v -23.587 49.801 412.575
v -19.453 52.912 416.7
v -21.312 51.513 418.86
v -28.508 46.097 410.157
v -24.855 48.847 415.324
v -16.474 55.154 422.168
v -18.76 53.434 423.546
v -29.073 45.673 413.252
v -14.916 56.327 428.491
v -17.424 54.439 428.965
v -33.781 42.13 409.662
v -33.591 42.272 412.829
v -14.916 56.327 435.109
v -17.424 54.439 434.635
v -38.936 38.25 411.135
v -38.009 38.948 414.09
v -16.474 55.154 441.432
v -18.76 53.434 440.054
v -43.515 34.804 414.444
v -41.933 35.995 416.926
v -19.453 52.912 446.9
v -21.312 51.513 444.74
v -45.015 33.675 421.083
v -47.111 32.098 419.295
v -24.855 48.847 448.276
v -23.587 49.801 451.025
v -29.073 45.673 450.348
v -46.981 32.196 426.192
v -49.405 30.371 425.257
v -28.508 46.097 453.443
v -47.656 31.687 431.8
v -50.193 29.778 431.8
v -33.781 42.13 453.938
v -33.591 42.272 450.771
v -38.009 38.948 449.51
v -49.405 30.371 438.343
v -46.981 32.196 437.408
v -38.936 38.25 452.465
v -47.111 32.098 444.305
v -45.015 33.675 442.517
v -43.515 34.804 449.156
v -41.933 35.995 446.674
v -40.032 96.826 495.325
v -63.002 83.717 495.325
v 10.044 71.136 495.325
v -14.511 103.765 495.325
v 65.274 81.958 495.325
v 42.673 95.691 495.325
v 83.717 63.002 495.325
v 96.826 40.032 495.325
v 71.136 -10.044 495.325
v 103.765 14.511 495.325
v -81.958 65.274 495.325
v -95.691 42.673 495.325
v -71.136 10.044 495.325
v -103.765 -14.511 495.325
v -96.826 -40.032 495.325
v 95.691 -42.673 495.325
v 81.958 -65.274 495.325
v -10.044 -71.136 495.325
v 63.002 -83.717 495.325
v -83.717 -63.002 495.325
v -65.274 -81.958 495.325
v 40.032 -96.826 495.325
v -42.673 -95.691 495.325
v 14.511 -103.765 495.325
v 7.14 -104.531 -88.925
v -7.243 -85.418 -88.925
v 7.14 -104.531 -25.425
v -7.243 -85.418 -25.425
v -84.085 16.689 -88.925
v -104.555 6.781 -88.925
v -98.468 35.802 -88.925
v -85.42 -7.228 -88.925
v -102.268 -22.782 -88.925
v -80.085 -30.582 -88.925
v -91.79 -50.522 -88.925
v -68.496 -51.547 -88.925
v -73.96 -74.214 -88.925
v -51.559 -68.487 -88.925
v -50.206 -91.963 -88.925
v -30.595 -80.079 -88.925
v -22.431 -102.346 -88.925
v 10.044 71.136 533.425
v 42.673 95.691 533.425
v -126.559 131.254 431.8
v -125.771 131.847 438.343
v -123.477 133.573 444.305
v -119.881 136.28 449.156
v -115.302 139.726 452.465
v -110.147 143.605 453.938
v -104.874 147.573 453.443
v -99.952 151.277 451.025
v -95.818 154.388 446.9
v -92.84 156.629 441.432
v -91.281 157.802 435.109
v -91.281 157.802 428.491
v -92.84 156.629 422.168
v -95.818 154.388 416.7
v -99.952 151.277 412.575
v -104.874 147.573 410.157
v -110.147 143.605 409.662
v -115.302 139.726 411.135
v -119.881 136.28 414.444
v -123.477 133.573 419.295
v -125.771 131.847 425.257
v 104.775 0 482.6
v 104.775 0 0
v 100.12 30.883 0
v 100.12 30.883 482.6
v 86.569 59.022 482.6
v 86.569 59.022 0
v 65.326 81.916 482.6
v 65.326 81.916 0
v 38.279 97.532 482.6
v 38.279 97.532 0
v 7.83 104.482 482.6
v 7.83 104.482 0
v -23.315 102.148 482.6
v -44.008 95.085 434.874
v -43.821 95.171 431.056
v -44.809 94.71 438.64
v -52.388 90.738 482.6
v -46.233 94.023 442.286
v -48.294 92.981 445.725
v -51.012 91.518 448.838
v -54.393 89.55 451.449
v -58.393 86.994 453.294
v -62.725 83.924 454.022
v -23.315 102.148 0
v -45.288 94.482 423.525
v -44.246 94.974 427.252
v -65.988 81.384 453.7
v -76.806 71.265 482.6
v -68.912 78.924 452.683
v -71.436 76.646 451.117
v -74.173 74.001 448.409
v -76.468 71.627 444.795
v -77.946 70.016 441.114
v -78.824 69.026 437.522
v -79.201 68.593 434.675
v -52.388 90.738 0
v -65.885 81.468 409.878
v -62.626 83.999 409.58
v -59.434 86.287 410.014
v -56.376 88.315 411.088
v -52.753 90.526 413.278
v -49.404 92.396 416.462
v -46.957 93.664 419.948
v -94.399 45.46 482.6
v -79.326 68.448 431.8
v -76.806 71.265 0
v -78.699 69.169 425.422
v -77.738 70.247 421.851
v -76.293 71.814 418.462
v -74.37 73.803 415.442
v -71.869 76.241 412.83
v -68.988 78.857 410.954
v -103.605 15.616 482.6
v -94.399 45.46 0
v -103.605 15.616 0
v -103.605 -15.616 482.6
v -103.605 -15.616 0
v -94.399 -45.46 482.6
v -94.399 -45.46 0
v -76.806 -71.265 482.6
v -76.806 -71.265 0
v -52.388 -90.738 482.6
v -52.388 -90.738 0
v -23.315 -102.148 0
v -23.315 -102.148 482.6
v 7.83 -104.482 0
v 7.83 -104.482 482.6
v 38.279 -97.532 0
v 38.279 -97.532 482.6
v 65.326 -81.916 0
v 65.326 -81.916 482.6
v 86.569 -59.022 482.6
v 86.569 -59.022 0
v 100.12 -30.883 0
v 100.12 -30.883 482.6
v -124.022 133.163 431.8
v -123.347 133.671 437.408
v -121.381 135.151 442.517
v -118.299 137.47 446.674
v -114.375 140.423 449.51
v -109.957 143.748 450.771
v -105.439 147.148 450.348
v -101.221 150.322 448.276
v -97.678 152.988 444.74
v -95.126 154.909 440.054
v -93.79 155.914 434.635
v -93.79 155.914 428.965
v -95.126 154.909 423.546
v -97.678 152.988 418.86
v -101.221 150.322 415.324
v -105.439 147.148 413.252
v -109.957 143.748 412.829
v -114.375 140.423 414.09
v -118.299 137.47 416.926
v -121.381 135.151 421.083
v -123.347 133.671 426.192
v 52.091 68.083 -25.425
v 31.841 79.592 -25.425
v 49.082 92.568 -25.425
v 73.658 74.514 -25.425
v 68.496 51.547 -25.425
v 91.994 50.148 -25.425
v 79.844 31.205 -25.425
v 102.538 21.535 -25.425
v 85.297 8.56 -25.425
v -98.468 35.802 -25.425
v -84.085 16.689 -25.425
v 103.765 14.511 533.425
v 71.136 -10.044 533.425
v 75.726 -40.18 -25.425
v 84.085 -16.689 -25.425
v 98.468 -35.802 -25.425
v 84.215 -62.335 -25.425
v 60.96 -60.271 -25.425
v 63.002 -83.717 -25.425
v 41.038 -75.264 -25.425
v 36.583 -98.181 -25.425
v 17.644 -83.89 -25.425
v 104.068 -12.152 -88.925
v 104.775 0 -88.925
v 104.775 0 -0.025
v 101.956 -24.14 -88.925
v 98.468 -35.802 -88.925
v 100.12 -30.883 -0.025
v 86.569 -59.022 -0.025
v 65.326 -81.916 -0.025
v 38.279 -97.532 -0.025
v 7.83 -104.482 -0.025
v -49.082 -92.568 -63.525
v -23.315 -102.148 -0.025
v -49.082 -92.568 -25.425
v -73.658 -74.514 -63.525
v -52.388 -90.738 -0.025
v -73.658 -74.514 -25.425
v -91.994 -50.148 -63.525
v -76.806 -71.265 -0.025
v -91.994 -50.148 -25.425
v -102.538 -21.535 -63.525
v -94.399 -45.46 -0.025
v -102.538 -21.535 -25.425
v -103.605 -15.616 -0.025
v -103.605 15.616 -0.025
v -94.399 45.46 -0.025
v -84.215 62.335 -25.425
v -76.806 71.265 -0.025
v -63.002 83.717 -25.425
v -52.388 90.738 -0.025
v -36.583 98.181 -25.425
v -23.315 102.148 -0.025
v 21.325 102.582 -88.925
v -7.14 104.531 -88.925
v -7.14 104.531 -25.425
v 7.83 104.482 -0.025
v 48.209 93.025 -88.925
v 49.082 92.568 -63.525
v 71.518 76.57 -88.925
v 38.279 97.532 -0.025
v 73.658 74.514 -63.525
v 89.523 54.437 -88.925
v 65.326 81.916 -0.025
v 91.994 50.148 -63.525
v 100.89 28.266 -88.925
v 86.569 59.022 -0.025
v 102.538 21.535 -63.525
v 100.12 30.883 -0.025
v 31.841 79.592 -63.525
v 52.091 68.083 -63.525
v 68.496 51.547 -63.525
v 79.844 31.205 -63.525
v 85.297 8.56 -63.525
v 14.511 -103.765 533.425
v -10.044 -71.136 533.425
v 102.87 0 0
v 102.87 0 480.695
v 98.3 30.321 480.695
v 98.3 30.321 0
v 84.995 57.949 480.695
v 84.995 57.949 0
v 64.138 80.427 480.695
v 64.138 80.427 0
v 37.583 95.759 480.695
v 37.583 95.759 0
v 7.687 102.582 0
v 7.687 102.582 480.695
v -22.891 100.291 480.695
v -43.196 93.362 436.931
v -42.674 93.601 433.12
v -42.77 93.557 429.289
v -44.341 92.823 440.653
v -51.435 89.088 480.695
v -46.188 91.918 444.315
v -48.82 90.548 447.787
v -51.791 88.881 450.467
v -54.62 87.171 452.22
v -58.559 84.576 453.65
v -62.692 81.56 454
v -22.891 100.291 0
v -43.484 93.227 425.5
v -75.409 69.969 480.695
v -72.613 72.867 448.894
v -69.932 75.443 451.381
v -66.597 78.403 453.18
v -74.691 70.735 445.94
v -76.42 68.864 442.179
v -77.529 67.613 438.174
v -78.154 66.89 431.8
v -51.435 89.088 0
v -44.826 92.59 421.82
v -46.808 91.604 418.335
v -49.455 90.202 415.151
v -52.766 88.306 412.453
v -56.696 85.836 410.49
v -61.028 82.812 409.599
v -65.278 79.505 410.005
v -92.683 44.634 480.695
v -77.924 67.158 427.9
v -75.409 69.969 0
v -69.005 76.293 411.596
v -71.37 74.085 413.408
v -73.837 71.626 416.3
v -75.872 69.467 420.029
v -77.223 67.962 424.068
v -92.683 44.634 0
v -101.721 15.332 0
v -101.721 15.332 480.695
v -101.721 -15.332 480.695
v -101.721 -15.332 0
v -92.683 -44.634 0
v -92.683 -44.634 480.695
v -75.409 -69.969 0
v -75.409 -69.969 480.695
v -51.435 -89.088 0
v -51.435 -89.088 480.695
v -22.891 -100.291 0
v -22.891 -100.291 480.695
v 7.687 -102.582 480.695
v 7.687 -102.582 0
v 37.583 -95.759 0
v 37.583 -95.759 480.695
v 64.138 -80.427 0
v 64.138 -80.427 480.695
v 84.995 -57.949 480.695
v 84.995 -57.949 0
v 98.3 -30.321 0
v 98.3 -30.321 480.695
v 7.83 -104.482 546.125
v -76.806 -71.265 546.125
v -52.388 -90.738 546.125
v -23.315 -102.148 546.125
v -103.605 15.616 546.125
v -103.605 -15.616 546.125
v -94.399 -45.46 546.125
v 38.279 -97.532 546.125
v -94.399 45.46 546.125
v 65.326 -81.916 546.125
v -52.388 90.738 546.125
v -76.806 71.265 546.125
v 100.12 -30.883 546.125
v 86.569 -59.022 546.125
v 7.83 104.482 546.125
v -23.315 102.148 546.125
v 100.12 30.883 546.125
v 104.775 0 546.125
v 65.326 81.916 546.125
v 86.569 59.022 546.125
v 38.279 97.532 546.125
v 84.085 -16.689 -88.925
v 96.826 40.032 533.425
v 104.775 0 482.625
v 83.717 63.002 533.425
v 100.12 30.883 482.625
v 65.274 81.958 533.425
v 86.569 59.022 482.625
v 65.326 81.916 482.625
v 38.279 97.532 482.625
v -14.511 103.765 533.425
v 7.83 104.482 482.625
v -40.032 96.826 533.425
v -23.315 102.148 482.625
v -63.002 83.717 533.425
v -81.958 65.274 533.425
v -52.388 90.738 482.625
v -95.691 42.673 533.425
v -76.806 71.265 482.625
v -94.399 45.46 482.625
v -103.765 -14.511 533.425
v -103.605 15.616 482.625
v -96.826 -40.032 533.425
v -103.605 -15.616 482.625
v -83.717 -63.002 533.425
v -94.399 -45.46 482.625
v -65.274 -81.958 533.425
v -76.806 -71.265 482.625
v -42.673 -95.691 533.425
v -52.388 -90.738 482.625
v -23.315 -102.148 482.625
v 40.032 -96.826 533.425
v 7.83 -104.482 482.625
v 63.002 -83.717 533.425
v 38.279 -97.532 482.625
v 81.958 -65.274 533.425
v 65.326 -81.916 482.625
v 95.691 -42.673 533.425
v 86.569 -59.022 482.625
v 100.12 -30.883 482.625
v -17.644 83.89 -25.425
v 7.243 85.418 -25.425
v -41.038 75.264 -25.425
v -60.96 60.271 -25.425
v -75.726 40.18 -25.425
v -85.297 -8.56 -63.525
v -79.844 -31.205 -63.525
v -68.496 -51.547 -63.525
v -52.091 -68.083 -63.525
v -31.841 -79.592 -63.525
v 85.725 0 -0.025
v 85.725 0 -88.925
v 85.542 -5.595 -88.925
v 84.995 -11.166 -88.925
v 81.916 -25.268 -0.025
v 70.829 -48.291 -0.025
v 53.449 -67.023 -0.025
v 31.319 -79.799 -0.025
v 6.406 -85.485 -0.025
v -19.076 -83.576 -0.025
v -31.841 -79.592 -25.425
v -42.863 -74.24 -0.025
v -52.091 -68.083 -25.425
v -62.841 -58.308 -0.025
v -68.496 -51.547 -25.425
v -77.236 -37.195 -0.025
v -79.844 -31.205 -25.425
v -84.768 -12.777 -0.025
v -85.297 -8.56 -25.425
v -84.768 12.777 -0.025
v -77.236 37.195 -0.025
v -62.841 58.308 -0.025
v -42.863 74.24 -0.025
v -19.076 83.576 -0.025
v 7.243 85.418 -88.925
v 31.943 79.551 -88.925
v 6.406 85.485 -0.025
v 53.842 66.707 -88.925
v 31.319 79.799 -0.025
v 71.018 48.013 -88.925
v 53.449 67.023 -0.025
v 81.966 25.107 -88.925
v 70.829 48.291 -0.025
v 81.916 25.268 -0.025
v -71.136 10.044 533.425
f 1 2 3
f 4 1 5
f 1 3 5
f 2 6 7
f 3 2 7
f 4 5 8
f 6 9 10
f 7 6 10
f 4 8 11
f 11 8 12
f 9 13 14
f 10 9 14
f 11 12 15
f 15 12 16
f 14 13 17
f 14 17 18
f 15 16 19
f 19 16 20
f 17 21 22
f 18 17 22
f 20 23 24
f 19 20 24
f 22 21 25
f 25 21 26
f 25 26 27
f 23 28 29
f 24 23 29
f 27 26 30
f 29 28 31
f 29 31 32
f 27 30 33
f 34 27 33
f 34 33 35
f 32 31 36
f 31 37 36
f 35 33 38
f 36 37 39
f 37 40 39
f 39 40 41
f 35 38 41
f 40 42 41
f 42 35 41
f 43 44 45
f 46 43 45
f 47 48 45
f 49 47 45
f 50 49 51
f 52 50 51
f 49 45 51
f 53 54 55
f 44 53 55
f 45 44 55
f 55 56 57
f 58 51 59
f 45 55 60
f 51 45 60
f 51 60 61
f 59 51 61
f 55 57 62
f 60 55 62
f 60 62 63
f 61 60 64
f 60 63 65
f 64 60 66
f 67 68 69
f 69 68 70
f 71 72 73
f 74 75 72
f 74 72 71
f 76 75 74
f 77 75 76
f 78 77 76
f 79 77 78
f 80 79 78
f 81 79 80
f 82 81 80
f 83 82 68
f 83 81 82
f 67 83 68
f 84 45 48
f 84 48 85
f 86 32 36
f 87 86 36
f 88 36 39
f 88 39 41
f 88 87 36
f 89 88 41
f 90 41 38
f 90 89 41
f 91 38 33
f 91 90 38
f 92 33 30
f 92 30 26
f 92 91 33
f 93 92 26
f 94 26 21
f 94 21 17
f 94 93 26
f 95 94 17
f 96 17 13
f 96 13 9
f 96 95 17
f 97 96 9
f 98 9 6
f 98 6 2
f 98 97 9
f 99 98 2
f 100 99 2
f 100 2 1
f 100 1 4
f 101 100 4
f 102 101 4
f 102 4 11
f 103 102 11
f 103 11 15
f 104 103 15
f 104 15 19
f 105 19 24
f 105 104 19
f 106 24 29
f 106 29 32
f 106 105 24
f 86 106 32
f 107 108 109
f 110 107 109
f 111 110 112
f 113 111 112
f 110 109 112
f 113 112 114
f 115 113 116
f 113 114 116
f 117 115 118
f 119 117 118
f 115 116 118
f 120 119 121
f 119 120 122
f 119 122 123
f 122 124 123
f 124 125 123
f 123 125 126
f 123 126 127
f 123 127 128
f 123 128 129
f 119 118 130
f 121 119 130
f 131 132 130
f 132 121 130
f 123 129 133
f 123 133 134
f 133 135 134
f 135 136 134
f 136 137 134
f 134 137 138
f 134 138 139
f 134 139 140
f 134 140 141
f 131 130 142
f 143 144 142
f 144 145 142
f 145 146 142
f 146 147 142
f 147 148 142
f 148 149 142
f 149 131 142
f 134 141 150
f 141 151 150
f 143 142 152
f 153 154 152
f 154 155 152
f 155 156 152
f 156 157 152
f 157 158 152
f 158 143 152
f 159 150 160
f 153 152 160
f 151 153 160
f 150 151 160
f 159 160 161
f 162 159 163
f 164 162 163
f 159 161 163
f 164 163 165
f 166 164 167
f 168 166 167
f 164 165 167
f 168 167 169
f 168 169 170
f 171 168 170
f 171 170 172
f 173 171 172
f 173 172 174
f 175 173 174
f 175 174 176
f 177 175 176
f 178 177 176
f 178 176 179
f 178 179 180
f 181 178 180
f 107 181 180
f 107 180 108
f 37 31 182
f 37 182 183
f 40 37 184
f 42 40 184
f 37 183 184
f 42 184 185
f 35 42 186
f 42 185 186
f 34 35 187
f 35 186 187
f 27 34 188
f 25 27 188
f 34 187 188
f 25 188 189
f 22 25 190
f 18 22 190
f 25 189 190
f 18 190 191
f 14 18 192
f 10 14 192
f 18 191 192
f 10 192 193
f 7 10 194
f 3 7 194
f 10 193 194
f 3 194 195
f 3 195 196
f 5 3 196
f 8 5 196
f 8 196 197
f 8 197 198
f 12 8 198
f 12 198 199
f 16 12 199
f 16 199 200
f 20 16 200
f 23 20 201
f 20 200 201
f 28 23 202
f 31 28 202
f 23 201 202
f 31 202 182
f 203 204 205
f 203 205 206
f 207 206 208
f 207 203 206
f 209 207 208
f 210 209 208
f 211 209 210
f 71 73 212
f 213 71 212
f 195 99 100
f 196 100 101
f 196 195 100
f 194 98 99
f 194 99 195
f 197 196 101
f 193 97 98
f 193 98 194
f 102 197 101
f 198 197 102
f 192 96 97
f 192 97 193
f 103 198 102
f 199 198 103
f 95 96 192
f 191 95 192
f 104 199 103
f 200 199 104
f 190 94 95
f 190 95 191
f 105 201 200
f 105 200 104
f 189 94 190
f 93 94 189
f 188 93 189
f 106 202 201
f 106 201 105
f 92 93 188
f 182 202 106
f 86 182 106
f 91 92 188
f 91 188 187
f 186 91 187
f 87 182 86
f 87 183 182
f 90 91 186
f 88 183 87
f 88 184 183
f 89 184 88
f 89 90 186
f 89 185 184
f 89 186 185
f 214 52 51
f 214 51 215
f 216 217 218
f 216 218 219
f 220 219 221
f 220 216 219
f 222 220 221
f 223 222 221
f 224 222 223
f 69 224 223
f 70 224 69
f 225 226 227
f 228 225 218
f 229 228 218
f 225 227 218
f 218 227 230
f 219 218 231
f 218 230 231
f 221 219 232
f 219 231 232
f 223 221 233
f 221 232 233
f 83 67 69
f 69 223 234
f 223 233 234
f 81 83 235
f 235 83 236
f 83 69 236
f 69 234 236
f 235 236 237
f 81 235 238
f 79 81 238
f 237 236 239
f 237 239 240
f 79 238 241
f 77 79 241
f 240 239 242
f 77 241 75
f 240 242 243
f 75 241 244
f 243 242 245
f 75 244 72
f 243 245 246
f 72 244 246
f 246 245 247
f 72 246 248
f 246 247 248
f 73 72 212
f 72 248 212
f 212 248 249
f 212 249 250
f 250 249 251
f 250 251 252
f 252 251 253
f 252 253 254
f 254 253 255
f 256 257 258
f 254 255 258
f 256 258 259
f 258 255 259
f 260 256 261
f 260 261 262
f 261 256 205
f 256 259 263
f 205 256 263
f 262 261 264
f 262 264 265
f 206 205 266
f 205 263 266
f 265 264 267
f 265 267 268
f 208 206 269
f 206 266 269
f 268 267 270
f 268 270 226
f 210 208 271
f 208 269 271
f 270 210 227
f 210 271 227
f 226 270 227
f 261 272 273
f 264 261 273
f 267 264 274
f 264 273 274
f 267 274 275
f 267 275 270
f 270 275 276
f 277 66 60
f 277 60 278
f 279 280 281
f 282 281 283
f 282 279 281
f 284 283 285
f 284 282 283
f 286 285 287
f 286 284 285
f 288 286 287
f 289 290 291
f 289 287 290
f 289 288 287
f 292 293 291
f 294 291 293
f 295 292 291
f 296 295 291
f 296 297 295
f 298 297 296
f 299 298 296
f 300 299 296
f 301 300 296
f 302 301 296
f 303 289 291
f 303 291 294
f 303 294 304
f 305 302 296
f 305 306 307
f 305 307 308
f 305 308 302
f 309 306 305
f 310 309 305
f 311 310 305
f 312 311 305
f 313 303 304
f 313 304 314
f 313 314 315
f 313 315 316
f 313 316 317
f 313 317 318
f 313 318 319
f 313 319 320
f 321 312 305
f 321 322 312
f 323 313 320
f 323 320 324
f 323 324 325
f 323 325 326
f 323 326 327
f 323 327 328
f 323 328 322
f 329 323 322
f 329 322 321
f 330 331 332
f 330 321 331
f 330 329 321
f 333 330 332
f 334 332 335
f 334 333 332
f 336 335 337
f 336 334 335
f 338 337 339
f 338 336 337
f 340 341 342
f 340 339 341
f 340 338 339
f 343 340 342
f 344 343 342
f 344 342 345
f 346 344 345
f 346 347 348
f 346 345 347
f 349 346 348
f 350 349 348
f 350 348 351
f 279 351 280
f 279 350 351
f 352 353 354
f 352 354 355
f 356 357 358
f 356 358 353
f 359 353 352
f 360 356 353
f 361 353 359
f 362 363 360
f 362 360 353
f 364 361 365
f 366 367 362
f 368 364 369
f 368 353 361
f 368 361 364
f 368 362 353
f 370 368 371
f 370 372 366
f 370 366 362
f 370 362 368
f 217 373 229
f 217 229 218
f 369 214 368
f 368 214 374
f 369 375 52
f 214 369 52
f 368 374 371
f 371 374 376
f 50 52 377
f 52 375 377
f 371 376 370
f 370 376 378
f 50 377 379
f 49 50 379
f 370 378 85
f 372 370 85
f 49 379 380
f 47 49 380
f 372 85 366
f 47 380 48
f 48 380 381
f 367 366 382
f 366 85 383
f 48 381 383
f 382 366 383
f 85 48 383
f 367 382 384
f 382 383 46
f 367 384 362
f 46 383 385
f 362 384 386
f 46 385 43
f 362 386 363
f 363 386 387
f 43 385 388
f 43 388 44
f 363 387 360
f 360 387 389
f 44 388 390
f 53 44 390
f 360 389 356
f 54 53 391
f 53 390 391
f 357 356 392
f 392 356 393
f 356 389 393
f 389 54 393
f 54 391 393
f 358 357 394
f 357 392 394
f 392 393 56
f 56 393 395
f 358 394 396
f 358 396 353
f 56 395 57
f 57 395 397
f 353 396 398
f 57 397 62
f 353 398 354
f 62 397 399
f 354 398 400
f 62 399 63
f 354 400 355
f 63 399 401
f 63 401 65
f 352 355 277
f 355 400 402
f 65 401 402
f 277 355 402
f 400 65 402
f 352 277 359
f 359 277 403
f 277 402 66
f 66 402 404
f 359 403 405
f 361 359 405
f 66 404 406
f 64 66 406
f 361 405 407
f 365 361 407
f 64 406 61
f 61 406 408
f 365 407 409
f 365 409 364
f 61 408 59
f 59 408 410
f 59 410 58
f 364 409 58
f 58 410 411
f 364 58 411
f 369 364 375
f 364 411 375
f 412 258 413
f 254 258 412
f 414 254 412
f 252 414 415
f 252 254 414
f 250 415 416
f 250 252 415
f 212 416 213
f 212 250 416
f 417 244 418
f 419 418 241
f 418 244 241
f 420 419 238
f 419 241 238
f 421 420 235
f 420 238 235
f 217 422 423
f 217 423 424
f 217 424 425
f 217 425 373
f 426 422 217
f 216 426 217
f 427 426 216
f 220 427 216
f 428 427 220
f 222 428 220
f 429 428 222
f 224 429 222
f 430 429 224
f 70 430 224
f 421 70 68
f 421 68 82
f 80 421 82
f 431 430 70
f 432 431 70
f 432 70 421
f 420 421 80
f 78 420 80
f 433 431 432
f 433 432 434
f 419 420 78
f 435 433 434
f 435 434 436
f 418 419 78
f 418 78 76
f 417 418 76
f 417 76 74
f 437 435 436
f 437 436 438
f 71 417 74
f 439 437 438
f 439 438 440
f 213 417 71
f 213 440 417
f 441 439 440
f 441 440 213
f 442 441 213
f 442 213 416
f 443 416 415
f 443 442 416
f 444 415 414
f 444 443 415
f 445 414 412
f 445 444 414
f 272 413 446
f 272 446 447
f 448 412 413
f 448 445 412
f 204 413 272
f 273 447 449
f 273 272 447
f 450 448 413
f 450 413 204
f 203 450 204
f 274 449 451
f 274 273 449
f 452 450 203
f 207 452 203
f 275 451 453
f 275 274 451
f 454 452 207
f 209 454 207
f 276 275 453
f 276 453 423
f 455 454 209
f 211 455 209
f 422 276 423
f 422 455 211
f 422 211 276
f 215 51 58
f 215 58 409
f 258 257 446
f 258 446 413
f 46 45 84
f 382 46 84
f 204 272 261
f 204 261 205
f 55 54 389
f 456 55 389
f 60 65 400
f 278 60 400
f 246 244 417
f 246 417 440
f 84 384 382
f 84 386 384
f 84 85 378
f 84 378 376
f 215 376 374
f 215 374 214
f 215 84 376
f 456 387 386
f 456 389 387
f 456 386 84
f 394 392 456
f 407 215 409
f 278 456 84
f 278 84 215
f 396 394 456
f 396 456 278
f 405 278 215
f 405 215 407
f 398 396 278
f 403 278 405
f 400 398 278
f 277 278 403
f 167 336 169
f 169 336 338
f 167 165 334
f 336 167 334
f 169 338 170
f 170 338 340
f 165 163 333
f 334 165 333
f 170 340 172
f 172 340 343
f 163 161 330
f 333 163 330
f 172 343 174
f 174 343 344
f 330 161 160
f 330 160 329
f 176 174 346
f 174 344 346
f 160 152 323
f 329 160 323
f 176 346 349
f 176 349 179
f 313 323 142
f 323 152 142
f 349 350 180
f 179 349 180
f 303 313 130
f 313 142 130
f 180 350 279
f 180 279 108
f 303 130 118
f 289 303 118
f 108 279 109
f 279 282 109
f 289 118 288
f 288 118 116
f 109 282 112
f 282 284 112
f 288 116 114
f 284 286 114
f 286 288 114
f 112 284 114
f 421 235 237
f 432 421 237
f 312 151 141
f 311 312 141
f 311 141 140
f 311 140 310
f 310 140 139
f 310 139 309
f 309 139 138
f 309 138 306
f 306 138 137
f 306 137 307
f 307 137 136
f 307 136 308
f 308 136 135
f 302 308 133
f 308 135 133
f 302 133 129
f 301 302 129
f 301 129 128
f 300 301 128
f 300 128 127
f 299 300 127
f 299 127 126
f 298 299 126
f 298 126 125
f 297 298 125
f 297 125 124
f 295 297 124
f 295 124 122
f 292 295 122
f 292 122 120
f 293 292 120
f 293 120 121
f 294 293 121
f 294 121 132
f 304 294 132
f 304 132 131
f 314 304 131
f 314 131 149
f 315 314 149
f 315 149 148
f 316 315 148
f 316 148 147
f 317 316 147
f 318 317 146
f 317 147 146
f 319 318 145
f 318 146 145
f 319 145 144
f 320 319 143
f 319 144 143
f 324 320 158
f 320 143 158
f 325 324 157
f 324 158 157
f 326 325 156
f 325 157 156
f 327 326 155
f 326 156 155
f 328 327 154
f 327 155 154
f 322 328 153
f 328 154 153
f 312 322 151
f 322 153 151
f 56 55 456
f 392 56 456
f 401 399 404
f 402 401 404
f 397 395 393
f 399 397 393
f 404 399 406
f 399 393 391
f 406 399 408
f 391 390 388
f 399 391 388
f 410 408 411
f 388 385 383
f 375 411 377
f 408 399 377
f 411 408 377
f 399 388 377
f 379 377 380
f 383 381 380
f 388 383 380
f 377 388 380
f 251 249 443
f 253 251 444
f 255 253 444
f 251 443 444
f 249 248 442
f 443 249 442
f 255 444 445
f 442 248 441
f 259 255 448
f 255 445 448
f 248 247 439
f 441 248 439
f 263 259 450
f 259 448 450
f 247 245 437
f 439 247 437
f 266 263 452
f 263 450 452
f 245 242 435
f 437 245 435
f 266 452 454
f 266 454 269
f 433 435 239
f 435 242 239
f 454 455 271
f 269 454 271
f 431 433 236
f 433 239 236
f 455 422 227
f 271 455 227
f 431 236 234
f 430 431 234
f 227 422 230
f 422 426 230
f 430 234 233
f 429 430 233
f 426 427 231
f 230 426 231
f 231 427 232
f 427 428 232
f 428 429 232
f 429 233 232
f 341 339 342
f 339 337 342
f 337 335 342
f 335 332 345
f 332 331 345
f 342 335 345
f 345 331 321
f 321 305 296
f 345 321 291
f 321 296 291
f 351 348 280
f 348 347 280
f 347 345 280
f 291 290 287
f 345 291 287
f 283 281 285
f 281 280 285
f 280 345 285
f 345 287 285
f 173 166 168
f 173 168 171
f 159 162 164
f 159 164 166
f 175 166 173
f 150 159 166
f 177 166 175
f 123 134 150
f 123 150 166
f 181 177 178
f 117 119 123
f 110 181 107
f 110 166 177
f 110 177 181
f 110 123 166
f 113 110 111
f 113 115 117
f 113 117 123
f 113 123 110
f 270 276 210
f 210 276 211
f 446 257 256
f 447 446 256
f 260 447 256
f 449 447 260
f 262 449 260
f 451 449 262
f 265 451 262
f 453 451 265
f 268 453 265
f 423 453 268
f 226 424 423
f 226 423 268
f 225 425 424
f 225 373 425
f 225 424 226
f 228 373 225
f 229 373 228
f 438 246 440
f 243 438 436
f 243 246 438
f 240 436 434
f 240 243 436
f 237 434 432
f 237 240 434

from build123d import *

# Parameters (mm, degrees)
F0_R      = 104.775
F1_DEPTH  = 482.6
F2_T      = -1.905
F4_R      = 104.775
F4_R_2    = 85.725
F5_DEPTH  = 88.9
F7_R      = 104.775
F8_DEPTH  = 63.5
F11_R     = 22.225
F12_DEPTH = 25.4
F14_W     = 101.6
F14_H     = 38.1
F14_H_2   = 50.8
F15_DEPTH = 251.4950231374
F16_W     = 101.6
F16_H     = 38.1
F17_DEPTH = 251.4950231374
F18_W     = 114.3
F18_H     = 63.5
F19_DEPTH = 251.4950231374
F20_W     = 88.9
F20_H     = 38.1
F21_DEPTH = 251.4950231374
F23_R     = 22.1996
F23_R_2   = 19.0246
F24_DEPTH = 127


with BuildPart() as f1:
    # F0 (on Top) → F1 (new body)
    with BuildSketch(Plane.XY):
        Circle(F0_R)
    extrude(amount=F1_DEPTH)

    # F2
    f2_openings = [f1.faces().sort_by_distance(p)[0] for p in [
        (0, 0, 0),
    ]]
    offset(amount=F2_T, openings=f2_openings)

    # F11 (on line) → F12 (cut)
    with BuildSketch(Plane(origin=(-63.0017904571, 83.7172325402, 0), x_dir=(-0.7990191605, -0.6013055639, 0), z_dir=(-0.6013055639, 0.7990191605, 0))):
        with Locations((0, 431.8)):
            Circle(F11_R)
    extrude(amount=-F12_DEPTH, mode=Mode.SUBTRACT)


with BuildPart() as f5:
    # F4 (on offset) → F5 (new body)
    with BuildSketch(Plane(origin=(0, 0, -0.0254), x_dir=(1, 0, 0), z_dir=(0, 0, -1))):
        Circle(F4_R)
        Circle(F4_R_2, mode=Mode.SUBTRACT)
    extrude(amount=F5_DEPTH)

    # F18 (on line) → F19 (cut, through all)
    with BuildSketch(Plane(origin=(-63.0017904571, 83.7172325402, 0), x_dir=(-0.7990191605, -0.6013055639, 0), z_dir=(-0.6013055639, 0.7990191605, 0))):
        with Locations((0, -57.1754)):
            Rectangle(F18_W, F18_H)
    extrude(amount=-F19_DEPTH, mode=Mode.SUBTRACT)

    # F20 (on line) → F21 (cut, through all)
    with BuildSketch(Plane(origin=(-83.7172325402, -63.0017904571, 0), x_dir=(0.6013055639, -0.7990191605, 0), z_dir=(-0.7990191605, -0.6013055639, 0))):
        with Locations((0, -44.4754)):
            Rectangle(F20_W, F20_H)
    extrude(amount=-F21_DEPTH, mode=Mode.SUBTRACT)


with BuildPart() as f8:
    # F7 (on offset) → F8 (new body)
    with BuildSketch(Plane.XY.offset(482.6254)):
        Circle(F7_R)
    extrude(amount=F8_DEPTH)

    # F14 (on line) → F15 (cut, through all)
    with BuildSketch(Plane(origin=(-83.7172325402, -63.0017904571, 0), x_dir=(0.6013055639, -0.7990191605, 0), z_dir=(-0.7990191605, -0.6013055639, 0))):
        with Locations((0, 514.3754)):
            Rectangle(F14_W, F14_H)
        with Locations((0, -44.4754)):
            Rectangle(F14_W, F14_H_2)
    extrude(amount=-F15_DEPTH, mode=Mode.SUBTRACT)

    # F16 (on line) → F17 (cut, through all)
    with BuildSketch(Plane(origin=(-63.0017904571, 83.7172325402, 0), x_dir=(-0.7990191605, -0.6013055639, 0), z_dir=(-0.6013055639, 0.7990191605, 0))):
        with Locations((0, 514.3754)):
            Rectangle(F16_W, F16_H)
    extrude(amount=-F17_DEPTH, mode=Mode.SUBTRACT)


with BuildPart() as f24:
    # F23 (on offset) → F24 (new body)
    with BuildSketch(Plane(origin=(-108.8212744259, 144.6024925695, 0), x_dir=(-0.7990191605, -0.6013055639, 0), z_dir=(-0.6013055639, 0.7990191605, 0))):
        with Locations((0, 431.8)):
            Circle(F23_R)
        with Locations((0, 431.8)):
            Circle(F23_R_2, mode=Mode.SUBTRACT)
    extrude(amount=-F24_DEPTH)


solid = Compound([f1.part, f5.part, f8.part, f24.part])
